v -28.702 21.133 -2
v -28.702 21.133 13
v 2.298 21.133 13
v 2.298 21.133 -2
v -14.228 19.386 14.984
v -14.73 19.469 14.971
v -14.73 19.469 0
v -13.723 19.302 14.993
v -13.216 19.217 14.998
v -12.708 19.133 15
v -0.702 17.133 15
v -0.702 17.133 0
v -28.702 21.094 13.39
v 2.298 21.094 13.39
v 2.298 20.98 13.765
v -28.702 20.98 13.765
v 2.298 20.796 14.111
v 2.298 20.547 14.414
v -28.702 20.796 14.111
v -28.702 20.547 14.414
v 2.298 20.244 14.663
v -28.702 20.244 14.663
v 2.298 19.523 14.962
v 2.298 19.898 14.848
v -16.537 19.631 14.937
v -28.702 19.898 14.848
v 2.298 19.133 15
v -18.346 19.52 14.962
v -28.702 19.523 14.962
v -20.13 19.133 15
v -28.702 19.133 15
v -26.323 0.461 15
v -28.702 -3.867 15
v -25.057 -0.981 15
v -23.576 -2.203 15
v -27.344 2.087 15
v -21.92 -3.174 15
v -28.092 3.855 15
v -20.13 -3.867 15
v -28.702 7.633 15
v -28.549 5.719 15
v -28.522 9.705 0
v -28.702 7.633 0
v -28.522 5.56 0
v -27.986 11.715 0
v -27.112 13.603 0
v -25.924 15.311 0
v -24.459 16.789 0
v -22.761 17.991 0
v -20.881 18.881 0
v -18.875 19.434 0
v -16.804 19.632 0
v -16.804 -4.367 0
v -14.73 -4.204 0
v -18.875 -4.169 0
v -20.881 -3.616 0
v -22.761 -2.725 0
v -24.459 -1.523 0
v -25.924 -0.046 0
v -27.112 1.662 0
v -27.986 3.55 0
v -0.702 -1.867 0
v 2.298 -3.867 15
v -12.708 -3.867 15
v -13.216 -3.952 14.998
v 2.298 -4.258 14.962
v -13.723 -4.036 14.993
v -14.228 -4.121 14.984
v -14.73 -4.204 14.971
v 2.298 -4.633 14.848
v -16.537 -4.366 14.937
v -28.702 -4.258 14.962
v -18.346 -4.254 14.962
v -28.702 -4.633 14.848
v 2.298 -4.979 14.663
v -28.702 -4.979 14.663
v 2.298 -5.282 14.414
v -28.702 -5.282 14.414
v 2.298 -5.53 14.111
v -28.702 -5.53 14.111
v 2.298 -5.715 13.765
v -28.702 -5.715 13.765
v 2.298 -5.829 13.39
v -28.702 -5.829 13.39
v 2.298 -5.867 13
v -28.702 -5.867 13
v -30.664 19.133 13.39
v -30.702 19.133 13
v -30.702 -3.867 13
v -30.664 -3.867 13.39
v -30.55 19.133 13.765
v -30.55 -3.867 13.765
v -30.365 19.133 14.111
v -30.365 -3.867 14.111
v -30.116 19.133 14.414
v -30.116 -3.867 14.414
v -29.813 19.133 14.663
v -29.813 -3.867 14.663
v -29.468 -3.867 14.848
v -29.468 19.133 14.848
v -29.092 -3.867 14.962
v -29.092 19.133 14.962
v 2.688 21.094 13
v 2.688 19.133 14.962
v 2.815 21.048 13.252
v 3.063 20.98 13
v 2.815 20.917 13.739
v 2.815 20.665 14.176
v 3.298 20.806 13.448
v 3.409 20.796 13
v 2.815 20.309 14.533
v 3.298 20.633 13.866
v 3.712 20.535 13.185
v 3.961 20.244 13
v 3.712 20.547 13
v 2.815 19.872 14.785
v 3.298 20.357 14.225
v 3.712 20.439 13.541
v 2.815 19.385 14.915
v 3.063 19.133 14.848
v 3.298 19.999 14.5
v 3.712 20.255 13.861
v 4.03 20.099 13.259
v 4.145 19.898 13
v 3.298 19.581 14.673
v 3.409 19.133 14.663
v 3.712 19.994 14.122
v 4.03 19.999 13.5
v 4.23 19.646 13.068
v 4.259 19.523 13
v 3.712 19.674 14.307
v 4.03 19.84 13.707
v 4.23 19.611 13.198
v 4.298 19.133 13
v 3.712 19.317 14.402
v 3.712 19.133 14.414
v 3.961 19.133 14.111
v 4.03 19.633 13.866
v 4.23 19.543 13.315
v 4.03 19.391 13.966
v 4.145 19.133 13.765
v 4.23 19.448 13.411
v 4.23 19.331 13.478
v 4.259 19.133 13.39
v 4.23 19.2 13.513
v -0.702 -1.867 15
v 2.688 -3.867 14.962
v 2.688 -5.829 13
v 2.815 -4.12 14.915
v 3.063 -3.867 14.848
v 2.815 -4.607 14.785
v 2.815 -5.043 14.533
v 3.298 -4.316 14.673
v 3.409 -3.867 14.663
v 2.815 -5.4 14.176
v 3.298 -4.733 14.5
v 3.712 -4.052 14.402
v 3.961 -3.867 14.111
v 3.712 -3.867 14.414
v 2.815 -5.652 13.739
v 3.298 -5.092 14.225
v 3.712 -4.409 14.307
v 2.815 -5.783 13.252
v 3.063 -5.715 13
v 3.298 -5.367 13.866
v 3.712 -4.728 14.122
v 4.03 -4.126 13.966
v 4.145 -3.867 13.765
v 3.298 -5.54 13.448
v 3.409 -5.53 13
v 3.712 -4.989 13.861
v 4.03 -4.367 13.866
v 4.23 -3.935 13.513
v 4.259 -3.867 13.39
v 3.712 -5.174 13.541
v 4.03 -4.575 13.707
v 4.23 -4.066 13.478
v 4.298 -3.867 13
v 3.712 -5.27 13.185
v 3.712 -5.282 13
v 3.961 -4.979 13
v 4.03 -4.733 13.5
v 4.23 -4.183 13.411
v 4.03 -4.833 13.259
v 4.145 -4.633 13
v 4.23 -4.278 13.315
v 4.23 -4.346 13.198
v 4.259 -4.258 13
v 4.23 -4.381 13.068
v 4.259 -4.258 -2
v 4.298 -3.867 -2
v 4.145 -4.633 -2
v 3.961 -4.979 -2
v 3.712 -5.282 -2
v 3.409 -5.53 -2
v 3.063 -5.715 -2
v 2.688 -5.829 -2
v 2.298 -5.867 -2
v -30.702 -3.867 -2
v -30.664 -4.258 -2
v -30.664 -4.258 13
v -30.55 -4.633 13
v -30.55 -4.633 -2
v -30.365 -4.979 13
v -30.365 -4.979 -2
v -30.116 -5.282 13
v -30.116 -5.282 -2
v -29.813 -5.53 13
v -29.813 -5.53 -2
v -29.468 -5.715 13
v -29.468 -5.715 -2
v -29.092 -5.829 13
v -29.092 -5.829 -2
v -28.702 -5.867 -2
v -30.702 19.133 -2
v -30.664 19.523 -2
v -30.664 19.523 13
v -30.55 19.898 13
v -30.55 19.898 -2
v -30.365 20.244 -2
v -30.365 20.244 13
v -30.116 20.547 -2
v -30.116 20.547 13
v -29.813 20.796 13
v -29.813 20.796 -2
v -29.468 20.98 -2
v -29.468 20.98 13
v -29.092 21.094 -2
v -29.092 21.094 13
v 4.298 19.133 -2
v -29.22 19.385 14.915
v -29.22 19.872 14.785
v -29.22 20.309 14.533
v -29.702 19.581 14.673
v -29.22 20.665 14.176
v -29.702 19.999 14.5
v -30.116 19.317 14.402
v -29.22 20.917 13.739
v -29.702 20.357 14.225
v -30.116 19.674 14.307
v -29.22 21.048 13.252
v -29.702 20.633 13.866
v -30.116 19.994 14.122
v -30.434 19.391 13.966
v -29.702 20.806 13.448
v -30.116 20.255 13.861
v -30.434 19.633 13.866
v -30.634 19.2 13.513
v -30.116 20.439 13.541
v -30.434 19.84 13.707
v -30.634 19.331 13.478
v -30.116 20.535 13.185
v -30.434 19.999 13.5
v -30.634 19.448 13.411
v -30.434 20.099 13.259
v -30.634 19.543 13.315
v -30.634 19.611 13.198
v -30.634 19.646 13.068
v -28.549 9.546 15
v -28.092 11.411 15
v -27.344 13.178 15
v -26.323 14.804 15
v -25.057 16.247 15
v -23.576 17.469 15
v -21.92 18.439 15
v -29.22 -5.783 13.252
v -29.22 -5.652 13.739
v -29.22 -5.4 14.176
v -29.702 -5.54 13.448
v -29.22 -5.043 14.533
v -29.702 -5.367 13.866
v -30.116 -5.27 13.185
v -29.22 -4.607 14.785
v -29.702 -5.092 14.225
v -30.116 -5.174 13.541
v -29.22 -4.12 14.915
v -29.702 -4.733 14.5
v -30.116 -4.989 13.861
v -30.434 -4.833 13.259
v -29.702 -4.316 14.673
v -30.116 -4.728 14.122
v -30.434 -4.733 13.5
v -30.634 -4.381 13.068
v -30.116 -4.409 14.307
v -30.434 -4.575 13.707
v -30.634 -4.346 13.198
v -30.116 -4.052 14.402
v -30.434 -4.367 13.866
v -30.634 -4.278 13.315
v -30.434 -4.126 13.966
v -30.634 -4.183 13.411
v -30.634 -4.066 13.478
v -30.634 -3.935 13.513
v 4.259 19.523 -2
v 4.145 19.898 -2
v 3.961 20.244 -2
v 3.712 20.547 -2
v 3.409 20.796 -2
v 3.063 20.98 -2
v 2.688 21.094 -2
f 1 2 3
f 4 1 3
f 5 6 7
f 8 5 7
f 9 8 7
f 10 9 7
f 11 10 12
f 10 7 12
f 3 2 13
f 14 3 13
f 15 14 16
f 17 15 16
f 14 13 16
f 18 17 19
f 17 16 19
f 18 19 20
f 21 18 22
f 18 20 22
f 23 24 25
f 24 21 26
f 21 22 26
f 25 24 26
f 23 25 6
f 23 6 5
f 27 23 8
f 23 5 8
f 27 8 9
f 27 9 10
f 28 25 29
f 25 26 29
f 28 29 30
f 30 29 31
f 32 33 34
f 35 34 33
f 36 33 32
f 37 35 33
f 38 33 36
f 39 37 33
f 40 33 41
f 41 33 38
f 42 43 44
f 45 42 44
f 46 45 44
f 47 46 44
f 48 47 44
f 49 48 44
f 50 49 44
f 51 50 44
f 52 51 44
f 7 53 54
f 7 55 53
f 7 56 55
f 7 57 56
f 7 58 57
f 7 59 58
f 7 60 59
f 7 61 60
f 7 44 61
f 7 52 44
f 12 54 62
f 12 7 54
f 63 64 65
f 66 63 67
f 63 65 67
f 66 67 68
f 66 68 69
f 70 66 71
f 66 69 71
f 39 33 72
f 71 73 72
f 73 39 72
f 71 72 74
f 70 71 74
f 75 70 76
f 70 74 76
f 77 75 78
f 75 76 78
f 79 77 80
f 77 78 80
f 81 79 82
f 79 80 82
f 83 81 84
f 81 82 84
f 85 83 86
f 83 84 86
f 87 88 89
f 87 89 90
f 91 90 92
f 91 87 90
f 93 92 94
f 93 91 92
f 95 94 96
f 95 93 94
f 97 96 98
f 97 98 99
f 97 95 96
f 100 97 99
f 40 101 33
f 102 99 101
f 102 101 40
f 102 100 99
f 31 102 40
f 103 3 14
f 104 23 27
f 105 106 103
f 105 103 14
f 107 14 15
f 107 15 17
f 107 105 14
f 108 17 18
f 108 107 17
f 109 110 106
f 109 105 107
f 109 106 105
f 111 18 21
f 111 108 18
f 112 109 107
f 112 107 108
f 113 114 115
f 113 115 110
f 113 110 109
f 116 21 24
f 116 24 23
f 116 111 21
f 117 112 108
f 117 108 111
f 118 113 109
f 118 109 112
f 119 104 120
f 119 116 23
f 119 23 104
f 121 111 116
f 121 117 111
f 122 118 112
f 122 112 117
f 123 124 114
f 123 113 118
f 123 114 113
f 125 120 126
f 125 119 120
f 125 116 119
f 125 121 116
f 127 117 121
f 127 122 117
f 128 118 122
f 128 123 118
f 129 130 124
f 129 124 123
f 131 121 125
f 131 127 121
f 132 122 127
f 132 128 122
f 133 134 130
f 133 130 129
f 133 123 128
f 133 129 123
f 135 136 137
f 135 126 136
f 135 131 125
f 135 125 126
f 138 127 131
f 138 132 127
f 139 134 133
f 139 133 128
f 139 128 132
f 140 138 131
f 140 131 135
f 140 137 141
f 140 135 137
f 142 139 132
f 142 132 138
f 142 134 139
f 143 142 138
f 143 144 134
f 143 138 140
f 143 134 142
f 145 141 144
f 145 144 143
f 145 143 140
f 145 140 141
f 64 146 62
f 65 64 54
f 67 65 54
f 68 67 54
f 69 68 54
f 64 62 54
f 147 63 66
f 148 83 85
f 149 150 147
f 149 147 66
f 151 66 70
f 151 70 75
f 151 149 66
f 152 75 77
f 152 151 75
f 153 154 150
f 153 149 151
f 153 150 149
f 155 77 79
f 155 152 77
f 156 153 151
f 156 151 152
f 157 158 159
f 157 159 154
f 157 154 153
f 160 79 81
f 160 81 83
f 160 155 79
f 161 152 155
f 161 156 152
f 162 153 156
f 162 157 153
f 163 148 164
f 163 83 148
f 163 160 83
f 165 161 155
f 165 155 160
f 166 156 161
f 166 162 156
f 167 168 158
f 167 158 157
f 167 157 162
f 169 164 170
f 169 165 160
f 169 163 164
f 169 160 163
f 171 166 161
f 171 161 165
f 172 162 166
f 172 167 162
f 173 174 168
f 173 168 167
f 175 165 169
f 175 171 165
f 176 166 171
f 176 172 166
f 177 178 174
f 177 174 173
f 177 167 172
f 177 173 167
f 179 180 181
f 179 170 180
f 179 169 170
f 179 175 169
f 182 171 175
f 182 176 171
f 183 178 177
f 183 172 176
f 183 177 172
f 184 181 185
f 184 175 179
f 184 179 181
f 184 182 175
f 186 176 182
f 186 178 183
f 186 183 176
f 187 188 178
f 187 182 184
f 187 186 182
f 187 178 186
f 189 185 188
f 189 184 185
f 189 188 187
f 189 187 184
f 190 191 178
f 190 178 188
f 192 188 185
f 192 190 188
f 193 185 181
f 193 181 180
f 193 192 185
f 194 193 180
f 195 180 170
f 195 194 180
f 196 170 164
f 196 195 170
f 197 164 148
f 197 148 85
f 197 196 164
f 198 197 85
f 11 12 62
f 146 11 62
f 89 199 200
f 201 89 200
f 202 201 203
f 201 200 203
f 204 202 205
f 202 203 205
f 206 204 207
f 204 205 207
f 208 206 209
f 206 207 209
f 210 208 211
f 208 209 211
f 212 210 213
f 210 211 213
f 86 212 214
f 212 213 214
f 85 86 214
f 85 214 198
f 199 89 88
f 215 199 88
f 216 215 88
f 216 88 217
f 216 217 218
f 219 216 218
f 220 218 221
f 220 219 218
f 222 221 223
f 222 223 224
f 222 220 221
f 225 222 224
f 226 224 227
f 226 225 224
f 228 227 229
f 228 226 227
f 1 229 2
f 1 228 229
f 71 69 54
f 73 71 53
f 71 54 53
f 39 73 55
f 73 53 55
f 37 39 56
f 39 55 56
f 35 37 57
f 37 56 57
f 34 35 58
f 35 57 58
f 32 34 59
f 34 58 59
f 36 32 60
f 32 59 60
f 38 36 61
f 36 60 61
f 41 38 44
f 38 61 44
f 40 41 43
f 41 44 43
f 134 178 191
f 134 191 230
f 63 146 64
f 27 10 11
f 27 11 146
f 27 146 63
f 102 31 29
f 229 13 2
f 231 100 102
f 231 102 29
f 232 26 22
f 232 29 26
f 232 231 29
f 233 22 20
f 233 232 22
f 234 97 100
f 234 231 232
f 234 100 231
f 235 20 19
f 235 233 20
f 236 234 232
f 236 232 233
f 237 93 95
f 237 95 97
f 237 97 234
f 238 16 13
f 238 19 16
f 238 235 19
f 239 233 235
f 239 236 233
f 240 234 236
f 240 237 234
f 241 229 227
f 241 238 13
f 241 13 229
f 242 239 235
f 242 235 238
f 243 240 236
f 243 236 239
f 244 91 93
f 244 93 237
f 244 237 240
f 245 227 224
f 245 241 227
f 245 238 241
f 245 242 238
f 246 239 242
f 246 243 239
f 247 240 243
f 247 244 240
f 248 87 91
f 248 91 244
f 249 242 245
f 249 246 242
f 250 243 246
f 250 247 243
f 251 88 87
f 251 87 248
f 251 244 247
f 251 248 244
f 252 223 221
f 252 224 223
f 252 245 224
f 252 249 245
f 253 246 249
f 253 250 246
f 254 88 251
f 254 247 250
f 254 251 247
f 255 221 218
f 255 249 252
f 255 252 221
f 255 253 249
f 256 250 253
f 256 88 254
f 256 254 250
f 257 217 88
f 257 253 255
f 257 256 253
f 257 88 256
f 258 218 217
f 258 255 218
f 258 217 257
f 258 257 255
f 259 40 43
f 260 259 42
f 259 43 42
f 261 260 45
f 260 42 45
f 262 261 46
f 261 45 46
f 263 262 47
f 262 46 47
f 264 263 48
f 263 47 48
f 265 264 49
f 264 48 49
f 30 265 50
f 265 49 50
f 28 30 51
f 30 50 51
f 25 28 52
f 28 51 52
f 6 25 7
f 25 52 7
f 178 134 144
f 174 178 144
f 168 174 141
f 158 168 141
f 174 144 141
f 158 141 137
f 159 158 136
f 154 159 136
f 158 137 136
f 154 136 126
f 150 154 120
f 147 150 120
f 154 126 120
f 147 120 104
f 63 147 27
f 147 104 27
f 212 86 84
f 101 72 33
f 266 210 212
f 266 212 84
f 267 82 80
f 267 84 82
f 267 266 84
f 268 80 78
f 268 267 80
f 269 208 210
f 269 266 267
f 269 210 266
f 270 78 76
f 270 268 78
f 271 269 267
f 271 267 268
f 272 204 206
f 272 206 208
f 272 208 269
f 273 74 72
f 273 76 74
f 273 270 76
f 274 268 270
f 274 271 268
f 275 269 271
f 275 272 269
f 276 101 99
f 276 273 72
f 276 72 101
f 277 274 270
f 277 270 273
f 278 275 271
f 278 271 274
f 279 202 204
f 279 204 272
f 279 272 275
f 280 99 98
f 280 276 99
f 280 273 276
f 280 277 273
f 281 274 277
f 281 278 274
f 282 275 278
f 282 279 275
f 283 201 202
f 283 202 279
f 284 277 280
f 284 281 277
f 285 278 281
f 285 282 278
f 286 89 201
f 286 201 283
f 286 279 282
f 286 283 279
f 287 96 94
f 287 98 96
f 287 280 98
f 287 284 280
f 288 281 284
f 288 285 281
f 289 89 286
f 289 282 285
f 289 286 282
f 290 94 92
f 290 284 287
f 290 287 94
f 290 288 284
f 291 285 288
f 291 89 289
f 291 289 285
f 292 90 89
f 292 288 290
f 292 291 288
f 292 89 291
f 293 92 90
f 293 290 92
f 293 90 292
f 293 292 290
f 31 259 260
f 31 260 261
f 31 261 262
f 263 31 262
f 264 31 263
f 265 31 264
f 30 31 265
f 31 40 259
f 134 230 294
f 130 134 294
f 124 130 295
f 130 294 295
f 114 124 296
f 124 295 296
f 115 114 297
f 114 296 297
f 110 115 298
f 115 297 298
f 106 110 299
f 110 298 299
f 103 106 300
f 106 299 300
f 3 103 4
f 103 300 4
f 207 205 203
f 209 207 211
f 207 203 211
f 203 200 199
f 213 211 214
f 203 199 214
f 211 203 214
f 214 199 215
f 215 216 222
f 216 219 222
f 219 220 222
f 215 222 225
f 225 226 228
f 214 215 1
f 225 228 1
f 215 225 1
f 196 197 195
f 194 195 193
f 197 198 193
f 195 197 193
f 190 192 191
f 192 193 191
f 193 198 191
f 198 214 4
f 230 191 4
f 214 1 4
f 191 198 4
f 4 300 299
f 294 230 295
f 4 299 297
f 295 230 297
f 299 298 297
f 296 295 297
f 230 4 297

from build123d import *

# Parameters (mm, degrees)
F0_W         = 35
F0_H         = 27
F1_DEPTH     = 15
F2_DEPTH     = 2
F3_T1_DEPTH  = 20
F3_T3_DEPTH  = 31
F3_T5_DEPTH  = 23
F3_S9_W      = 2
F3_S9_H      = 2
F3_T10_DEPTH = 2
F3_S15_W     = 2
F3_S15_H     = 2
F3_T16_DEPTH = 2
F3_S21_W     = 2
F3_S21_H     = 2
F3_T22_DEPTH = 2
F3_S27_W     = 2
F3_S27_H     = 2
F3_T28_DEPTH = 2


# Not quite as in the source:
# - a fillet or chamfer that OpenCascade refuses, or shapes differently, is made with other operations: its cross-section is extruded or revolved along the edge and cut away or added


with BuildPart() as f1:
    # F0 (on Top) → F1 (new body)
    with BuildSketch(Plane.XY):
        with Locations((-13.2022674233, 7.6325895488)):
            Rectangle(F0_W, F0_H)
        with BuildLine():
            Line((-14.73041686, 19.4694728107), (-0.7022674233, 17.1325895488))
            Line((-0.7022674233, 17.1325895488), (-0.7022674233, 7.6325895488))
            Line((-0.7022674233, 7.6325895488), (-0.7022674233, -1.8674104512))
            Line((-0.7022674233, -1.8674104512), (-14.73041686, -4.2042937131))
            ThreePointArc((-14.73041686, -4.2042937131), (-24.4591286842, -1.5233431387), (-28.7022674233, 7.6325895488))
            ThreePointArc((-28.7022674233, 7.6325895488), (-24.4591286842, 16.7885222364), (-14.73041686, 19.4694728107))
        make_face(mode=Mode.SUBTRACT)
    extrude(amount=F1_DEPTH)

    # F0 (on Top) → F2 (join)
    with BuildSketch(Plane.XY):
        with Locations((-13.2022674233, 7.6325895488)):
            Rectangle(F0_W, F0_H)
        with BuildLine():
            Line((-14.73041686, 19.4694728107), (-0.7022674233, 17.1325895488))
            Line((-0.7022674233, 17.1325895488), (-0.7022674233, 7.6325895488))
            Line((-0.7022674233, 7.6325895488), (-0.7022674233, -1.8674104512))
            Line((-0.7022674233, -1.8674104512), (-14.73041686, -4.2042937131))
            ThreePointArc((-14.73041686, -4.2042937131), (-24.4591286842, -1.5233431387), (-28.7022674233, 7.6325895488))
            ThreePointArc((-28.7022674233, 7.6325895488), (-24.4591286842, 16.7885222364), (-14.73041686, 19.4694728107))
        make_face(mode=Mode.SUBTRACT)
        with BuildLine():
            ThreePointArc((-14.73041686, -4.2042937131), (-7.5463347357, -0.1242717121), (-4.7022674233, 7.6325895488))
            Line((-4.7022674233, 7.6325895488), (-28.7022674233, 7.6325895488))
            ThreePointArc((-28.7022674233, 7.6325895488), (-24.4591286842, -1.5233431387), (-14.73041686, -4.2042937131))
        make_face()
        with BuildLine():
            ThreePointArc((-4.7022674233, 7.6325895488), (-7.5463347357, 15.3894508097), (-14.73041686, 19.4694728107))
            ThreePointArc((-14.73041686, 19.4694728107), (-24.4591286842, 16.7885222364), (-28.7022674233, 7.6325895488))
            Line((-28.7022674233, 7.6325895488), (-4.7022674233, 7.6325895488))
        make_face()
        with BuildLine():
            Line((-0.7022674233, 7.6325895488), (-0.7022674233, 17.1325895488))
            Line((-0.7022674233, 17.1325895488), (-14.73041686, 19.4694728107))
            ThreePointArc((-14.73041686, 19.4694728107), (-7.5463347357, 15.3894508097), (-4.7022674233, 7.6325895488))
            Line((-4.7022674233, 7.6325895488), (-0.7022674233, 7.6325895488))
        make_face()
        with BuildLine():
            Line((-0.7022674233, -1.8674104512), (-0.7022674233, 7.6325895488))
            Line((-0.7022674233, 7.6325895488), (-4.7022674233, 7.6325895488))
            ThreePointArc((-4.7022674233, 7.6325895488), (-7.5463347357, -0.1242717121), (-14.73041686, -4.2042937131))
            Line((-14.73041686, -4.2042937131), (-0.7022674233, -1.8674104512))
        make_face()
    extrude(amount=-F2_DEPTH)

    # F3: fillet of radius 2 on 8 edges, made by hand

    # F3_s2 → F3_t1 (cut)
    with BuildSketch(Plane.XY.offset(-7)):
        with BuildLine():
            ThreePointArc((-30.7022674233, -3.8674104512), (-30.1164809856, -5.2816240135), (-28.7022674233, -5.8674104512))
            Line((-28.7022674233, -5.8674104512), (-30.7022674233, -5.8674104512))
            Line((-30.7022674233, -5.8674104512), (-30.7022674233, -3.8674104512))
        make_face()
        with BuildLine():
            ThreePointArc((4.2977325767, -3.8674104512), (3.7119461391, -5.2816240135), (2.2977325767, -5.8674104512))
            Line((2.2977325767, -5.8674104512), (4.2977325767, -5.8674104512))
            Line((4.2977325767, -5.8674104512), (4.2977325767, -3.8674104512))
        make_face()
        with BuildLine():
            ThreePointArc((4.2977325767, 19.1325895488), (3.7119461391, 20.5468031112), (2.2977325767, 21.1325895488))
            Line((2.2977325767, 21.1325895488), (4.2977325767, 21.1325895488))
            Line((4.2977325767, 21.1325895488), (4.2977325767, 19.1325895488))
        make_face()
        with BuildLine():
            ThreePointArc((-30.7022674233, 19.1325895488), (-30.1164809856, 20.5468031112), (-28.7022674233, 21.1325895488))
            Line((-28.7022674233, 21.1325895488), (-30.7022674233, 21.1325895488))
            Line((-30.7022674233, 21.1325895488), (-30.7022674233, 19.1325895488))
        make_face()
    extrude(amount=F3_T1_DEPTH, mode=Mode.SUBTRACT)

    # F3_s4 → F3_t3 (cut)
    with BuildSketch(Plane.YZ.offset(-28.7022674233)):
        with BuildLine():
            ThreePointArc((-3.8674104512, 15), (-5.2816240135, 14.4142135624), (-5.8674104512, 13))
            Line((-5.8674104512, 13), (-5.8674104512, 15))
            Line((-5.8674104512, 15), (-3.8674104512, 15))
        make_face()
        with BuildLine():
            ThreePointArc((21.1325895488, 13), (20.5468031112, 14.4142135624), (19.1325895488, 15))
            Line((19.1325895488, 15), (21.1325895488, 15))
            Line((21.1325895488, 15), (21.1325895488, 13))
        make_face()
    extrude(amount=F3_T3_DEPTH, mode=Mode.SUBTRACT)

    # F3_s6 → F3_t5 (cut)
    with BuildSketch(Plane.XZ.offset(-19.1325895488)):
        with BuildLine():
            ThreePointArc((4.2977325767, 13), (3.7119461391, 14.4142135624), (2.2977325767, 15))
            Line((2.2977325767, 15), (4.2977325767, 15))
            Line((4.2977325767, 15), (4.2977325767, 13))
        make_face()
        with BuildLine():
            ThreePointArc((-30.7022674233, 13), (-30.1164809856, 14.4142135624), (-28.7022674233, 15))
            Line((-28.7022674233, 15), (-30.7022674233, 15))
            Line((-30.7022674233, 15), (-30.7022674233, 13))
        make_face()
    extrude(amount=F3_T5_DEPTH, mode=Mode.SUBTRACT)


with BuildPart() as f3_tool8:
    # F3_s9 → F3_t10 (new body)
    with BuildSketch(Plane.YZ.offset(-28.7022674233)):
        with Locations((-4.8674104512, 14)):
            Rectangle(F3_S9_W, F3_S9_H)
    extrude(amount=-F3_T10_DEPTH)

    # F3_s11 → F3_t12 (revolve, cut)
    with BuildSketch(Plane(origin=(-28.7022674233, -3.8674104512, 13), x_dir=(0, 0.7071067812, -0.7071067812), z_dir=(0, 0.7071067812, 0.7071067812))):
        with BuildLine():
            ThreePointArc((0, -2), (2, 0), (0, 2))
            Line((0, 2), (0, -2))
        make_face()
    revolve(axis=Axis((-28.7022674233, -3.8674104512, 13), (-1, 0, 0)), mode=Mode.SUBTRACT)


with BuildPart() as f1_1:
    add(f1.part)

    # F3_t7: cut F3_tool8
    add(f3_tool8.part, mode=Mode.SUBTRACT)


with BuildPart() as f3_tool14:
    # F3_s15 → F3_t16 (new body)
    with BuildSketch(Plane.YZ.offset(2.2977325767)):
        with Locations((-4.8674104512, 14)):
            Rectangle(F3_S15_W, F3_S15_H)
    extrude(amount=F3_T16_DEPTH)

    # F3_s17 → F3_t18 (revolve, cut)
    with BuildSketch(Plane(origin=(2.2977325767, -3.8674104512, 13), x_dir=(0, 0.7071067812, -0.7071067812), z_dir=(0, -0.7071067812, -0.7071067812))):
        with BuildLine():
            ThreePointArc((0, -2), (2, 0), (0, 2))
            Line((0, 2), (0, -2))
        make_face()
    revolve(axis=Axis((2.2977325767, -3.8674104512, 13), (1, 0, 0)), mode=Mode.SUBTRACT)


with BuildPart() as f1_2:
    add(f1_1.part)

    # F3_t13: cut F3_tool14
    add(f3_tool14.part, mode=Mode.SUBTRACT)


with BuildPart() as f3_tool20:
    # F3_s21 → F3_t22 (new body)
    with BuildSketch(Plane.YZ.offset(2.2977325767)):
        with Locations((20.1325895488, 14)):
            Rectangle(F3_S21_W, F3_S21_H)
    extrude(amount=F3_T22_DEPTH)

    # F3_s23 → F3_t24 (revolve, cut)
    with BuildSketch(Plane(origin=(2.2977325767, 19.1325895488, 13), x_dir=(0, -0.7071067812, -0.7071067812), z_dir=(0, -0.7071067812, 0.7071067812))):
        with BuildLine():
            ThreePointArc((0, -2), (2, 0), (0, 2))
            Line((0, 2), (0, -2))
        make_face()
    revolve(axis=Axis((2.2977325767, 19.1325895488, 13), (1, 0, 0)), mode=Mode.SUBTRACT)


with BuildPart() as f1_3:
    add(f1_2.part)

    # F3_t19: cut F3_tool20
    add(f3_tool20.part, mode=Mode.SUBTRACT)


with BuildPart() as f3_tool26:
    # F3_s27 → F3_t28 (new body)
    with BuildSketch(Plane.YZ.offset(-28.7022674233)):
        with Locations((20.1325895488, 14)):
            Rectangle(F3_S27_W, F3_S27_H)
    extrude(amount=-F3_T28_DEPTH)

    # F3_s29 → F3_t30 (revolve, cut)
    with BuildSketch(Plane(origin=(-28.7022674233, 19.1325895488, 13), x_dir=(0, -0.7071067812, -0.7071067812), z_dir=(0, 0.7071067812, -0.7071067812))):
        with BuildLine():
            ThreePointArc((0, -2), (2, 0), (0, 2))
            Line((0, 2), (0, -2))
        make_face()
    revolve(axis=Axis((-28.7022674233, 19.1325895488, 13), (-1, 0, 0)), mode=Mode.SUBTRACT)


with BuildPart() as f1_4:
    add(f1_3.part)

    # F3_t25: cut F3_tool26
    add(f3_tool26.part, mode=Mode.SUBTRACT)


solid = f1_4.part
